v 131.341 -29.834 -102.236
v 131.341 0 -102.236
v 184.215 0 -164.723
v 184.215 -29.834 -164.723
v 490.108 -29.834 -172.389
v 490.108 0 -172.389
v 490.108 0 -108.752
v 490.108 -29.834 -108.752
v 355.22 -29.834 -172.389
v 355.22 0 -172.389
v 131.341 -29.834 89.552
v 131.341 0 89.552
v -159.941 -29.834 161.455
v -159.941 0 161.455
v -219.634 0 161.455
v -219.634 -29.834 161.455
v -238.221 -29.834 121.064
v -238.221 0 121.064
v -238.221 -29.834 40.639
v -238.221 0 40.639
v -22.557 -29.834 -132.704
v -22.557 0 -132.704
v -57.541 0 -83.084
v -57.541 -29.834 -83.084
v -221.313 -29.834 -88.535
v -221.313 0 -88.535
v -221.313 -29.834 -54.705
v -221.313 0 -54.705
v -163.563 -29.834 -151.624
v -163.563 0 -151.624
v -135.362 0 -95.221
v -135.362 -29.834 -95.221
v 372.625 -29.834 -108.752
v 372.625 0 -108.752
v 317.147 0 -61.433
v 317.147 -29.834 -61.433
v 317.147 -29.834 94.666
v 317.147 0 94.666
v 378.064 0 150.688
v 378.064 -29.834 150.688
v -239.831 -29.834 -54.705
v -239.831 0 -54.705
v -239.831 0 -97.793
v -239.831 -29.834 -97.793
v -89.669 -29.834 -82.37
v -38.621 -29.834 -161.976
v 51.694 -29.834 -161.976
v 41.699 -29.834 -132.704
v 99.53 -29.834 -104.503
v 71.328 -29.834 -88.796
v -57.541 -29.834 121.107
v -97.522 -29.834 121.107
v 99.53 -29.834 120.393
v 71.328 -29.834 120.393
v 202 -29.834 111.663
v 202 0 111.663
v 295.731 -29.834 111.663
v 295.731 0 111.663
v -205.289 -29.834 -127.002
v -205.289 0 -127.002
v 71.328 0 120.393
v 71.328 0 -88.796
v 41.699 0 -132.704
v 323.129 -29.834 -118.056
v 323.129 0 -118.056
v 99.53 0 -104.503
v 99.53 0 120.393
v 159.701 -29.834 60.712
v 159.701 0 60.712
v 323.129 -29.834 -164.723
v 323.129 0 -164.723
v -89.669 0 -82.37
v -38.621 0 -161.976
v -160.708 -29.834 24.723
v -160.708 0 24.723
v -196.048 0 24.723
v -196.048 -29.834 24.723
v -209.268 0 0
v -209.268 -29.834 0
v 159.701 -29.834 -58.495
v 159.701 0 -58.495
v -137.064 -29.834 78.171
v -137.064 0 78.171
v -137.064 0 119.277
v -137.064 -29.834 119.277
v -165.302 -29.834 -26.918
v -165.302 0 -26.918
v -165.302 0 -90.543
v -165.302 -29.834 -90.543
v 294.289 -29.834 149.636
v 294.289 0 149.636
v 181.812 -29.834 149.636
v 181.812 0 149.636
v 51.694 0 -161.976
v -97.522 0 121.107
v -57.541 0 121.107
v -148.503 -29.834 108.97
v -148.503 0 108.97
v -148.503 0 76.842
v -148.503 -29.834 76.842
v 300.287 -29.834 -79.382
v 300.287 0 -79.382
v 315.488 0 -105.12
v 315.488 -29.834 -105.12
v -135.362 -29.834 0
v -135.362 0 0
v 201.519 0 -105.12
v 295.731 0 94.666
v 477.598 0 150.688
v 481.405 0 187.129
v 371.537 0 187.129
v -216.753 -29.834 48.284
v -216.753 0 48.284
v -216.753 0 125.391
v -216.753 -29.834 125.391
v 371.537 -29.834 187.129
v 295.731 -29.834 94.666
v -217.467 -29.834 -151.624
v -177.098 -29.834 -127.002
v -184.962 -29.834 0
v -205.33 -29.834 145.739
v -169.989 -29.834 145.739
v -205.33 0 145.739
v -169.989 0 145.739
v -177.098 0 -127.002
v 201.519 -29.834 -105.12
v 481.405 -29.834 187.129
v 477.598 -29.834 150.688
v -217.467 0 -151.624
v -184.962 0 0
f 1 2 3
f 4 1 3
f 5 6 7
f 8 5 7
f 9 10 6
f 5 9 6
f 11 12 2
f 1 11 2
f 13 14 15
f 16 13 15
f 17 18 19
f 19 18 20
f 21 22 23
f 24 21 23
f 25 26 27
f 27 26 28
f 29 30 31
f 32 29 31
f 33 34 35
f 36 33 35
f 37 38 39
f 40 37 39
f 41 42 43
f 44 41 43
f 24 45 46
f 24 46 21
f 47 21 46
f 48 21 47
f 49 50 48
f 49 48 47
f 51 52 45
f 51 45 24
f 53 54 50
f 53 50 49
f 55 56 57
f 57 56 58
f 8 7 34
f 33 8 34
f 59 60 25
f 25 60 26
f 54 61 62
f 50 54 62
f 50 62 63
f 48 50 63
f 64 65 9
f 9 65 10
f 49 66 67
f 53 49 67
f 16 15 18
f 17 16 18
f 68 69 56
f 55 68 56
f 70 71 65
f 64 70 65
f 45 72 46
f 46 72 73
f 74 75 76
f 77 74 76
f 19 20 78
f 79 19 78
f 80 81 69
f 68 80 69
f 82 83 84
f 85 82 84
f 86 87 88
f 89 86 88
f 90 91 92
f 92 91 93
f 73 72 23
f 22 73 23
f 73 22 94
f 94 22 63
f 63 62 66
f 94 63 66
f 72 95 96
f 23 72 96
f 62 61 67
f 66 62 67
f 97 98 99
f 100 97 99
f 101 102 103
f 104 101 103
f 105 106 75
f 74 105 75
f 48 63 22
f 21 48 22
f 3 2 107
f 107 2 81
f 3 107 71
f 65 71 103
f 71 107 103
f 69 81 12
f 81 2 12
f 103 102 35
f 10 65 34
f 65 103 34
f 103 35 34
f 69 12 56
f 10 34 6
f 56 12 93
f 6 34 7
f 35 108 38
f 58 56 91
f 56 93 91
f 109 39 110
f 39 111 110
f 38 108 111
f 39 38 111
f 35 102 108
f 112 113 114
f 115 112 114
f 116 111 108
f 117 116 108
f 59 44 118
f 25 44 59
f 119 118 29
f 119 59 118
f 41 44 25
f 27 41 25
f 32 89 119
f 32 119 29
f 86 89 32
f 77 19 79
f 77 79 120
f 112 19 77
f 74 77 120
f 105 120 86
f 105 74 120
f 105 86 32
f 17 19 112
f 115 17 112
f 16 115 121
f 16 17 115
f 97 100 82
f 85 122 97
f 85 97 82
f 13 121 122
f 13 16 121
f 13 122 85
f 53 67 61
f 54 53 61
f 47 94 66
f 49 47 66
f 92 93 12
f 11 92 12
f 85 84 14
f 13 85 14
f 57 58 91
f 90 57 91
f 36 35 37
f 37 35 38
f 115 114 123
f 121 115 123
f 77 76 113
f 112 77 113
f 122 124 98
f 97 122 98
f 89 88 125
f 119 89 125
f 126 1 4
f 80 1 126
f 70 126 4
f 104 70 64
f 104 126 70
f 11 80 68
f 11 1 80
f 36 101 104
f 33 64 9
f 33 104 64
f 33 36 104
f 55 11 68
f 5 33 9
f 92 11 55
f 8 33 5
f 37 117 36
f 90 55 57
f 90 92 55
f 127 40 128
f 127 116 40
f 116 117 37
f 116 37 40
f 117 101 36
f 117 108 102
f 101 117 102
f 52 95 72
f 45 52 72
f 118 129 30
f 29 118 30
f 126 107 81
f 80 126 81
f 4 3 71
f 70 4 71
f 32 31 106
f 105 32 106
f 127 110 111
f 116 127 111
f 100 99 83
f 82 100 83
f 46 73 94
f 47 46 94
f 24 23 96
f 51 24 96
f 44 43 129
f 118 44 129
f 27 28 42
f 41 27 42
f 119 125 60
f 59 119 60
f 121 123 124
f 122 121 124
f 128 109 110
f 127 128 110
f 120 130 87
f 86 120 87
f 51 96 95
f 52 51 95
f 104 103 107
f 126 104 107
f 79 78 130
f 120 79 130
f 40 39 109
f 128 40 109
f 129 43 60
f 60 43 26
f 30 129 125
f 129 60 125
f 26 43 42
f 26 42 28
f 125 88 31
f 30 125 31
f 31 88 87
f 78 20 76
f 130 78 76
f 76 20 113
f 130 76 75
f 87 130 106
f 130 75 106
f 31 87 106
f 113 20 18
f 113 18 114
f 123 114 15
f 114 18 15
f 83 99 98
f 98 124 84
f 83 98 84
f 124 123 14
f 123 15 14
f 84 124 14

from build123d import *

# Parameters (mm, degrees)
F1_DEPTH = 29.8341475427


with BuildPart() as f1:
    # F0 (on Front) → F1 (new body)
    with BuildSketch(Plane.XZ):
        Polygon((-148.5025882721, 76.8419206142), (-137.0643973351, 78.1708806753), (-137.0643973351, 119.2769035697), (-159.9407792091, 161.4552587271), (-219.6338474751, 161.4552587271), (-238.2209151983, 121.0640817881), (-238.2209151983, 40.6392663717), (-209.267988801, 0), (-184.9617958069, 0), (-165.3023958206, -26.9176065922), (-165.3023958206, -90.5425548553), (-177.0980358124, -127.0018219948), (-205.2890211344, -127.0018219948), (-221.3134765625, -88.5346829891), (-221.3134765625, -54.7052621841), (-239.8306280375, -54.7052621841), (-239.8306280375, -97.793251276), (-217.4670100212, -151.6239643097), (-177.8424680233, -151.6239643097), (-163.5633409023, -151.6239643097), (-135.3620588779, -95.2214896679), (-135.3620588779, 0), (-160.7075035572, 24.7231274843), (-196.0483193398, 24.7231274843), (-216.7530655861, 48.2836812735), (-216.7530655861, 125.3909319639), (-205.3297609091, 145.7386910915), (-169.9889302254, 145.7386910915), (-148.5025882721, 108.9699417353), align=None)
    extrude(amount=F1_DEPTH)


with BuildPart() as f1b:
    # F0 (on Front) → F1, piece 2 (new body)
    with BuildSketch(Plane.XZ):
        Polygon((-57.5408637524, 121.1072057486), (-97.5224077702, 121.1072057486), (-89.6688699722, -82.3702514172), (-38.6210083961, -161.9763970375), (51.6944229603, -161.9763970375), (99.529504776, -104.5029163361), (99.529504776, 120.3932464123), (71.3282227516, 120.3932464123), (71.3282227516, -88.7958705425), (41.699051857, -132.7041685581), (-22.5570201874, -132.7041685581), (-57.5408637524, -83.0842256546), align=None)
    extrude(amount=F1_DEPTH)


with BuildPart() as f1c:
    # F0 (on Front) → F1, piece 3 (new body)
    with BuildSketch(Plane.XZ):
        Polygon((295.7310676575, 111.6632521152), (294.2889928818, 149.6363133192), (181.8118095398, 149.6363133192), (131.341278553, 89.5523428917), (131.341278553, -102.2356450558), (184.2151880264, -164.7229790688), (323.1292963028, -164.7229790688), (323.1292963028, -118.0562528618), (315.4883873759, -105.1196753979), (201.519370079, -105.1196753979), (159.7009897232, -58.4945380688), (159.7009897232, 60.7120394707), (202.0000815392, 111.6632521152), align=None)
        Polygon((315.4883873759, -105.1196753979), (323.1292963028, -118.0562528618), (323.1292963028, -105.1196753979), align=None)
        Polygon((323.1292963028, -105.1196753979), (323.1292963028, -118.0562528618), (355.2204370499, -172.3887324333), (490.1076555252, -172.3887324333), (490.1076555252, -108.7524592876), (372.6252317429, -108.7524592876), (317.1474933624, -61.4332258701), (317.1474933624, 94.6659147739), (378.0642747879, 150.6875753403), (477.5978922844, 150.6875753403), (481.4051389694, 187.1288567781), (371.5373873711, 187.1288567781), (295.7310676575, 94.6659147739), (300.286591053, -79.3820023537), (315.4883873759, -105.1196753979), align=None)
    extrude(amount=F1_DEPTH)


solid = Compound([f1.part, f1b.part, f1c.part])
